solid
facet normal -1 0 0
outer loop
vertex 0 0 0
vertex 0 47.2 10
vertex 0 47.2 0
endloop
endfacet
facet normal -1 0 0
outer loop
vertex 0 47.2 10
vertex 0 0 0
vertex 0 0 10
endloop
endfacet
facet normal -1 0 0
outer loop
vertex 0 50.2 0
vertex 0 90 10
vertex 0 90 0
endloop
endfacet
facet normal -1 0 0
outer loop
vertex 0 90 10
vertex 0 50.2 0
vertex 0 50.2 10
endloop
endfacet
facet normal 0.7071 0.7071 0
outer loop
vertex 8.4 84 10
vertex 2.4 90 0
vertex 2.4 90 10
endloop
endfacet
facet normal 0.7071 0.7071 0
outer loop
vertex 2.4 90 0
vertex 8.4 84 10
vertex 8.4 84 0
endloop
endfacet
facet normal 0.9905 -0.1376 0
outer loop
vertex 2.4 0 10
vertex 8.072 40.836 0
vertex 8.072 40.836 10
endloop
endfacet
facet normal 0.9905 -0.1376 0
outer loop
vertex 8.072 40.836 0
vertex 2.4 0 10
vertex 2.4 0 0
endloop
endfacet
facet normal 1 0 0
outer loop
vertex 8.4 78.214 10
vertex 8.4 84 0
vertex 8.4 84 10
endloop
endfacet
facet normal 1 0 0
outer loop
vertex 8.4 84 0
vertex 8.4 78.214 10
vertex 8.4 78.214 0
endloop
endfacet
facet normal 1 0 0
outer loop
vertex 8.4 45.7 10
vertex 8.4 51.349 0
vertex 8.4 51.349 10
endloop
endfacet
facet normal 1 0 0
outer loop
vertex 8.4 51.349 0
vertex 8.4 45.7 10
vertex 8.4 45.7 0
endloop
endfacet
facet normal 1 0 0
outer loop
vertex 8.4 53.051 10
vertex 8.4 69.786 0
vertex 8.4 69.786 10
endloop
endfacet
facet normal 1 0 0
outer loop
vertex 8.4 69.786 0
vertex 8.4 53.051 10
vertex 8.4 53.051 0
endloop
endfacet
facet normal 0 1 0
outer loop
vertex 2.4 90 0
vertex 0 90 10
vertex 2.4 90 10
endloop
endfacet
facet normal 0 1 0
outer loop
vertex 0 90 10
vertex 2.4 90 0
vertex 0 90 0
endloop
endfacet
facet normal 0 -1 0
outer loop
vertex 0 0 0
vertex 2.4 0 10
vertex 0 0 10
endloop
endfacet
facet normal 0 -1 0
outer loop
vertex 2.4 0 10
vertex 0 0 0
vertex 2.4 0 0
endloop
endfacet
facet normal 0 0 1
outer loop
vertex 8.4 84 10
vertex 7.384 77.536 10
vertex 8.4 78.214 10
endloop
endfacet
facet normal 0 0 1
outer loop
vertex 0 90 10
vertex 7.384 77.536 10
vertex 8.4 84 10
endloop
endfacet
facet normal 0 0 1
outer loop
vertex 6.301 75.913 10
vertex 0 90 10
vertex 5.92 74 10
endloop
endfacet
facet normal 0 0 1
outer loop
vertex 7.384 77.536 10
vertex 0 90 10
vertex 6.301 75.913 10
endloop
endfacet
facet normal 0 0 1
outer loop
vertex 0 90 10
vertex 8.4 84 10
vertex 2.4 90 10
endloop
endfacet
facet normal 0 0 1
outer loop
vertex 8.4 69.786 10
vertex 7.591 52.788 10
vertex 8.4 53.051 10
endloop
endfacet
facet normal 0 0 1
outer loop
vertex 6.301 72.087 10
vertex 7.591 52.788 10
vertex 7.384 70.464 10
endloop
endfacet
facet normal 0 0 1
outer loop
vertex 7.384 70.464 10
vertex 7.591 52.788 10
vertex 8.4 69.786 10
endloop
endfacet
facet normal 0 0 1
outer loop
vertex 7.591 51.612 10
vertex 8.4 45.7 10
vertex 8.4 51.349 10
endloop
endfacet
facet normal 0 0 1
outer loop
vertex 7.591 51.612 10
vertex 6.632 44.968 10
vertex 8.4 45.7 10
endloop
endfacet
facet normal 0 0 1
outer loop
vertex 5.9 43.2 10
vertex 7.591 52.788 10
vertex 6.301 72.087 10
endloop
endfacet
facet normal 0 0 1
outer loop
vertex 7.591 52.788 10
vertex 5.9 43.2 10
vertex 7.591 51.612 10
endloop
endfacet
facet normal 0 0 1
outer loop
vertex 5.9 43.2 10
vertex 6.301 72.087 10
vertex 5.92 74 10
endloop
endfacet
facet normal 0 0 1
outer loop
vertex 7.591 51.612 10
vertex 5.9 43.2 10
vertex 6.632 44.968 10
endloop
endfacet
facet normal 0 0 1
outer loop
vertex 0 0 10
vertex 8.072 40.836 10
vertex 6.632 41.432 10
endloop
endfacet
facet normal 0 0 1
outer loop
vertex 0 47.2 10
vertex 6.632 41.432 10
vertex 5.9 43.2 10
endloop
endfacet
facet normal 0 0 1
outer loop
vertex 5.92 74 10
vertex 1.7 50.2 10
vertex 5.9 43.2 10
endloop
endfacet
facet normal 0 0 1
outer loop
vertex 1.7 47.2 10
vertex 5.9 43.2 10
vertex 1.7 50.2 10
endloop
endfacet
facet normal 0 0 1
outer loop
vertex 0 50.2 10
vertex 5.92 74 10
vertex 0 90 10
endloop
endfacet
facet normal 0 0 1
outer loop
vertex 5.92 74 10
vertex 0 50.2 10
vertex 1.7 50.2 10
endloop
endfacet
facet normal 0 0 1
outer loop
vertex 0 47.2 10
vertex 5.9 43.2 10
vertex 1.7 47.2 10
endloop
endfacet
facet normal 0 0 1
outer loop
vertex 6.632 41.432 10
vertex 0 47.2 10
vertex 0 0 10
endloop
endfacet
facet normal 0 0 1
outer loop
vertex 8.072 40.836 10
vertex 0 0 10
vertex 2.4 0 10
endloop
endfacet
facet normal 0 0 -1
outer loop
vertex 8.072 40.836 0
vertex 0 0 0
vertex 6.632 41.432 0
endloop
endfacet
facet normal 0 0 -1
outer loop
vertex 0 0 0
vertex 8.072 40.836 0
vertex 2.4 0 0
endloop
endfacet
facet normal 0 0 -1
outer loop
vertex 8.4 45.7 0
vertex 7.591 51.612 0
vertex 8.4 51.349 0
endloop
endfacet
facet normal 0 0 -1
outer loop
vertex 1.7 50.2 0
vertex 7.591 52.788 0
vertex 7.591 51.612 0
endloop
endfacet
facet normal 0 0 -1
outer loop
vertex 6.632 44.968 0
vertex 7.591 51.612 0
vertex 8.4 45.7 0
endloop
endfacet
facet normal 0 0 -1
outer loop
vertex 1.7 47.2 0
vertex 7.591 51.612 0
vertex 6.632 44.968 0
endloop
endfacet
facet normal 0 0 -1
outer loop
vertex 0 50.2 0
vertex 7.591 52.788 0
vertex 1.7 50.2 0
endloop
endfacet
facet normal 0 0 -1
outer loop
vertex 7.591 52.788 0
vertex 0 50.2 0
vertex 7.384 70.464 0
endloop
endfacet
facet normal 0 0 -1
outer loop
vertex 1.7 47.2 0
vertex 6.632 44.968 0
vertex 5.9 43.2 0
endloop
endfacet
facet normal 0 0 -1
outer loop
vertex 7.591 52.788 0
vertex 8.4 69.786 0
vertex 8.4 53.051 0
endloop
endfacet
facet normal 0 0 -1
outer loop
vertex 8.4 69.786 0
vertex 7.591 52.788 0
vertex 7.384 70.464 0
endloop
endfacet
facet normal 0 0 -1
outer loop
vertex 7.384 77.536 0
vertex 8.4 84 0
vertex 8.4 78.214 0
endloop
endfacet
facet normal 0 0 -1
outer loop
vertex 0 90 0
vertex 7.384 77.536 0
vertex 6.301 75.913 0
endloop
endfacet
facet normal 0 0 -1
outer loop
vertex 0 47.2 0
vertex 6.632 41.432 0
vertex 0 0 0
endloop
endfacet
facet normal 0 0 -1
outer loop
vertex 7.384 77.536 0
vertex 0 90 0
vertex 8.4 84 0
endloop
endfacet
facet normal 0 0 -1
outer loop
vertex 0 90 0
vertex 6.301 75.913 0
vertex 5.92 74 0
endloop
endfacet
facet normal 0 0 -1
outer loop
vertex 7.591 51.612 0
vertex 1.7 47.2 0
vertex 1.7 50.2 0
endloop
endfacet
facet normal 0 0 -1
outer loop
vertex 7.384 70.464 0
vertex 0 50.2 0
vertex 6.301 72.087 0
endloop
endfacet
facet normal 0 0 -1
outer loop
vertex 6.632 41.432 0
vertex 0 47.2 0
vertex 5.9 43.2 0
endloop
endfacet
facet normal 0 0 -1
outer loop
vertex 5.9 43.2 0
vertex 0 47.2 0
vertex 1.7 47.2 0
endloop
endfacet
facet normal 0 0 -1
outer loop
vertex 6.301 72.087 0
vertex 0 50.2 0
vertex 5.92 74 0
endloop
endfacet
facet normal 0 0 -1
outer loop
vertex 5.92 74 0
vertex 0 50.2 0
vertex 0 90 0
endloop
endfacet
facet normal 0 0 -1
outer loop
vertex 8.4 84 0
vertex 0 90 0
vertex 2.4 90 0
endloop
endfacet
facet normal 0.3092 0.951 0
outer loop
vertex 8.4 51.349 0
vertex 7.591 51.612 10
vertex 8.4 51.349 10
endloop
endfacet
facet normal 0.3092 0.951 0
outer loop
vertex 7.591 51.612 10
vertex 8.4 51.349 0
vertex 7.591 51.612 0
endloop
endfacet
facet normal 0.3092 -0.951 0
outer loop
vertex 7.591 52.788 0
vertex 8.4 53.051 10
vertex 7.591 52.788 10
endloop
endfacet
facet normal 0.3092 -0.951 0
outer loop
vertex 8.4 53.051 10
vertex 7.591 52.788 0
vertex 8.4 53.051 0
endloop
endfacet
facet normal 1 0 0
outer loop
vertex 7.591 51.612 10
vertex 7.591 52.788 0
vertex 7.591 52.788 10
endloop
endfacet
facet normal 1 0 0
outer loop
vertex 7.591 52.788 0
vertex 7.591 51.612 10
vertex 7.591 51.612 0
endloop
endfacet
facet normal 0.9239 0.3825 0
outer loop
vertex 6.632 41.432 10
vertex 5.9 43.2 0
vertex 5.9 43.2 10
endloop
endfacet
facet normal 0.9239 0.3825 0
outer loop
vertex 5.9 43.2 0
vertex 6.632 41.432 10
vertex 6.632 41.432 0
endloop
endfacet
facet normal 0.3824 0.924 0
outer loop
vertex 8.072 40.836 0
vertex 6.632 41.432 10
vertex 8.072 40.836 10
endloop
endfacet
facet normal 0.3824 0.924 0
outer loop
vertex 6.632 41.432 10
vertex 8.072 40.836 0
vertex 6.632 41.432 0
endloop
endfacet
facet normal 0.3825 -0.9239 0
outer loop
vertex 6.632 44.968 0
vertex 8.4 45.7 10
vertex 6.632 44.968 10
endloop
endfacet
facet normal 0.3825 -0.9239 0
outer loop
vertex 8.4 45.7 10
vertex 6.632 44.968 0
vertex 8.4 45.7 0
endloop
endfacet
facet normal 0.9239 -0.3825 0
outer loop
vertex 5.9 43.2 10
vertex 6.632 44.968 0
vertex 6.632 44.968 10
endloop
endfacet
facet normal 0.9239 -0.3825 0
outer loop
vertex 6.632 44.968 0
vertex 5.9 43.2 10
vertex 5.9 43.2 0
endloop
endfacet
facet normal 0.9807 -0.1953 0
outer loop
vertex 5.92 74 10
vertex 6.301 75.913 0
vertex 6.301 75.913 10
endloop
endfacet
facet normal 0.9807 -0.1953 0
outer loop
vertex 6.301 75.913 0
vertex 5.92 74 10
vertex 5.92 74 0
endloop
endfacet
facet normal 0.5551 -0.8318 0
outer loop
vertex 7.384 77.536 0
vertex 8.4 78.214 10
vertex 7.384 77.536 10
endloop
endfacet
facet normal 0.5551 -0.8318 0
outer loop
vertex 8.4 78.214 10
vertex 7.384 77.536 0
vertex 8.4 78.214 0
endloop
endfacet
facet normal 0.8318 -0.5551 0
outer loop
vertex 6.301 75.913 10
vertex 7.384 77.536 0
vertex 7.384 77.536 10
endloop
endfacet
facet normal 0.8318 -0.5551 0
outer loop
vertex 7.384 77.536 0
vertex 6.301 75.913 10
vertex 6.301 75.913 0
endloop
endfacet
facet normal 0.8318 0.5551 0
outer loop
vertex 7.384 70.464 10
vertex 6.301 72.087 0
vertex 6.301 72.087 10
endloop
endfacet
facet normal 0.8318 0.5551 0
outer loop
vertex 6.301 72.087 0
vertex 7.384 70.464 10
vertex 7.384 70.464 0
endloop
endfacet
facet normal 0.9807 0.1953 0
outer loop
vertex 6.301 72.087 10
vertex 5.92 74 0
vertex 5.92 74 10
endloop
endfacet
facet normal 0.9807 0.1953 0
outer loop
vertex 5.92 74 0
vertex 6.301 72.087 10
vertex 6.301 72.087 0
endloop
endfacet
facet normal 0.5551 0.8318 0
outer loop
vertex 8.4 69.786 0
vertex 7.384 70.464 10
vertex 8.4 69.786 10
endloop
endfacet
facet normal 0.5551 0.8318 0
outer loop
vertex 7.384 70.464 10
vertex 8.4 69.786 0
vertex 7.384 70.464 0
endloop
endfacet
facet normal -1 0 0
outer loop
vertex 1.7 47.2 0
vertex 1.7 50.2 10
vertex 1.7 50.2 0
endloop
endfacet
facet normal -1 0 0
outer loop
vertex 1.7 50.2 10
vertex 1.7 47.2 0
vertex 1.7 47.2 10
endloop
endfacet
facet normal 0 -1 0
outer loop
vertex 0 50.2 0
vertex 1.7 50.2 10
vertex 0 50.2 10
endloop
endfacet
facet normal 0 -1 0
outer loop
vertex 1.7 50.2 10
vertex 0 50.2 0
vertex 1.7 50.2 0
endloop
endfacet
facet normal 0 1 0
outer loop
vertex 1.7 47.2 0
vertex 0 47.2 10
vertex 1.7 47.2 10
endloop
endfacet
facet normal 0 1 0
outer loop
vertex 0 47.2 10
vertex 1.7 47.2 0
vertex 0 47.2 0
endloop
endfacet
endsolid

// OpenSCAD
PEG (90, 10);

module PEG (lenght, width) {
	A=lenght;
	B=lenght*(2/75);
	C=lenght*(7/75);
	D=lenght*(70/75);
	E=lenght*(36/75);	
	difference(){	
		linear_extrude(height=width)
		polygon(points=[[0,0],[0,A],[B,A],[C,D],[C,E],[B,0]],paths=[[0,1,2,3,4,5]]);
		translate([C,E+9,0]) cylinder(h = width, r=1);
		translate([C,E,0]) cylinder(h = width, r=2.5);
		translate([C*1.3,D-10,0]) cylinder(h = width, r=5);
		translate([0,E+4,0]) cube([1.7,3,width]);	
	}
}
